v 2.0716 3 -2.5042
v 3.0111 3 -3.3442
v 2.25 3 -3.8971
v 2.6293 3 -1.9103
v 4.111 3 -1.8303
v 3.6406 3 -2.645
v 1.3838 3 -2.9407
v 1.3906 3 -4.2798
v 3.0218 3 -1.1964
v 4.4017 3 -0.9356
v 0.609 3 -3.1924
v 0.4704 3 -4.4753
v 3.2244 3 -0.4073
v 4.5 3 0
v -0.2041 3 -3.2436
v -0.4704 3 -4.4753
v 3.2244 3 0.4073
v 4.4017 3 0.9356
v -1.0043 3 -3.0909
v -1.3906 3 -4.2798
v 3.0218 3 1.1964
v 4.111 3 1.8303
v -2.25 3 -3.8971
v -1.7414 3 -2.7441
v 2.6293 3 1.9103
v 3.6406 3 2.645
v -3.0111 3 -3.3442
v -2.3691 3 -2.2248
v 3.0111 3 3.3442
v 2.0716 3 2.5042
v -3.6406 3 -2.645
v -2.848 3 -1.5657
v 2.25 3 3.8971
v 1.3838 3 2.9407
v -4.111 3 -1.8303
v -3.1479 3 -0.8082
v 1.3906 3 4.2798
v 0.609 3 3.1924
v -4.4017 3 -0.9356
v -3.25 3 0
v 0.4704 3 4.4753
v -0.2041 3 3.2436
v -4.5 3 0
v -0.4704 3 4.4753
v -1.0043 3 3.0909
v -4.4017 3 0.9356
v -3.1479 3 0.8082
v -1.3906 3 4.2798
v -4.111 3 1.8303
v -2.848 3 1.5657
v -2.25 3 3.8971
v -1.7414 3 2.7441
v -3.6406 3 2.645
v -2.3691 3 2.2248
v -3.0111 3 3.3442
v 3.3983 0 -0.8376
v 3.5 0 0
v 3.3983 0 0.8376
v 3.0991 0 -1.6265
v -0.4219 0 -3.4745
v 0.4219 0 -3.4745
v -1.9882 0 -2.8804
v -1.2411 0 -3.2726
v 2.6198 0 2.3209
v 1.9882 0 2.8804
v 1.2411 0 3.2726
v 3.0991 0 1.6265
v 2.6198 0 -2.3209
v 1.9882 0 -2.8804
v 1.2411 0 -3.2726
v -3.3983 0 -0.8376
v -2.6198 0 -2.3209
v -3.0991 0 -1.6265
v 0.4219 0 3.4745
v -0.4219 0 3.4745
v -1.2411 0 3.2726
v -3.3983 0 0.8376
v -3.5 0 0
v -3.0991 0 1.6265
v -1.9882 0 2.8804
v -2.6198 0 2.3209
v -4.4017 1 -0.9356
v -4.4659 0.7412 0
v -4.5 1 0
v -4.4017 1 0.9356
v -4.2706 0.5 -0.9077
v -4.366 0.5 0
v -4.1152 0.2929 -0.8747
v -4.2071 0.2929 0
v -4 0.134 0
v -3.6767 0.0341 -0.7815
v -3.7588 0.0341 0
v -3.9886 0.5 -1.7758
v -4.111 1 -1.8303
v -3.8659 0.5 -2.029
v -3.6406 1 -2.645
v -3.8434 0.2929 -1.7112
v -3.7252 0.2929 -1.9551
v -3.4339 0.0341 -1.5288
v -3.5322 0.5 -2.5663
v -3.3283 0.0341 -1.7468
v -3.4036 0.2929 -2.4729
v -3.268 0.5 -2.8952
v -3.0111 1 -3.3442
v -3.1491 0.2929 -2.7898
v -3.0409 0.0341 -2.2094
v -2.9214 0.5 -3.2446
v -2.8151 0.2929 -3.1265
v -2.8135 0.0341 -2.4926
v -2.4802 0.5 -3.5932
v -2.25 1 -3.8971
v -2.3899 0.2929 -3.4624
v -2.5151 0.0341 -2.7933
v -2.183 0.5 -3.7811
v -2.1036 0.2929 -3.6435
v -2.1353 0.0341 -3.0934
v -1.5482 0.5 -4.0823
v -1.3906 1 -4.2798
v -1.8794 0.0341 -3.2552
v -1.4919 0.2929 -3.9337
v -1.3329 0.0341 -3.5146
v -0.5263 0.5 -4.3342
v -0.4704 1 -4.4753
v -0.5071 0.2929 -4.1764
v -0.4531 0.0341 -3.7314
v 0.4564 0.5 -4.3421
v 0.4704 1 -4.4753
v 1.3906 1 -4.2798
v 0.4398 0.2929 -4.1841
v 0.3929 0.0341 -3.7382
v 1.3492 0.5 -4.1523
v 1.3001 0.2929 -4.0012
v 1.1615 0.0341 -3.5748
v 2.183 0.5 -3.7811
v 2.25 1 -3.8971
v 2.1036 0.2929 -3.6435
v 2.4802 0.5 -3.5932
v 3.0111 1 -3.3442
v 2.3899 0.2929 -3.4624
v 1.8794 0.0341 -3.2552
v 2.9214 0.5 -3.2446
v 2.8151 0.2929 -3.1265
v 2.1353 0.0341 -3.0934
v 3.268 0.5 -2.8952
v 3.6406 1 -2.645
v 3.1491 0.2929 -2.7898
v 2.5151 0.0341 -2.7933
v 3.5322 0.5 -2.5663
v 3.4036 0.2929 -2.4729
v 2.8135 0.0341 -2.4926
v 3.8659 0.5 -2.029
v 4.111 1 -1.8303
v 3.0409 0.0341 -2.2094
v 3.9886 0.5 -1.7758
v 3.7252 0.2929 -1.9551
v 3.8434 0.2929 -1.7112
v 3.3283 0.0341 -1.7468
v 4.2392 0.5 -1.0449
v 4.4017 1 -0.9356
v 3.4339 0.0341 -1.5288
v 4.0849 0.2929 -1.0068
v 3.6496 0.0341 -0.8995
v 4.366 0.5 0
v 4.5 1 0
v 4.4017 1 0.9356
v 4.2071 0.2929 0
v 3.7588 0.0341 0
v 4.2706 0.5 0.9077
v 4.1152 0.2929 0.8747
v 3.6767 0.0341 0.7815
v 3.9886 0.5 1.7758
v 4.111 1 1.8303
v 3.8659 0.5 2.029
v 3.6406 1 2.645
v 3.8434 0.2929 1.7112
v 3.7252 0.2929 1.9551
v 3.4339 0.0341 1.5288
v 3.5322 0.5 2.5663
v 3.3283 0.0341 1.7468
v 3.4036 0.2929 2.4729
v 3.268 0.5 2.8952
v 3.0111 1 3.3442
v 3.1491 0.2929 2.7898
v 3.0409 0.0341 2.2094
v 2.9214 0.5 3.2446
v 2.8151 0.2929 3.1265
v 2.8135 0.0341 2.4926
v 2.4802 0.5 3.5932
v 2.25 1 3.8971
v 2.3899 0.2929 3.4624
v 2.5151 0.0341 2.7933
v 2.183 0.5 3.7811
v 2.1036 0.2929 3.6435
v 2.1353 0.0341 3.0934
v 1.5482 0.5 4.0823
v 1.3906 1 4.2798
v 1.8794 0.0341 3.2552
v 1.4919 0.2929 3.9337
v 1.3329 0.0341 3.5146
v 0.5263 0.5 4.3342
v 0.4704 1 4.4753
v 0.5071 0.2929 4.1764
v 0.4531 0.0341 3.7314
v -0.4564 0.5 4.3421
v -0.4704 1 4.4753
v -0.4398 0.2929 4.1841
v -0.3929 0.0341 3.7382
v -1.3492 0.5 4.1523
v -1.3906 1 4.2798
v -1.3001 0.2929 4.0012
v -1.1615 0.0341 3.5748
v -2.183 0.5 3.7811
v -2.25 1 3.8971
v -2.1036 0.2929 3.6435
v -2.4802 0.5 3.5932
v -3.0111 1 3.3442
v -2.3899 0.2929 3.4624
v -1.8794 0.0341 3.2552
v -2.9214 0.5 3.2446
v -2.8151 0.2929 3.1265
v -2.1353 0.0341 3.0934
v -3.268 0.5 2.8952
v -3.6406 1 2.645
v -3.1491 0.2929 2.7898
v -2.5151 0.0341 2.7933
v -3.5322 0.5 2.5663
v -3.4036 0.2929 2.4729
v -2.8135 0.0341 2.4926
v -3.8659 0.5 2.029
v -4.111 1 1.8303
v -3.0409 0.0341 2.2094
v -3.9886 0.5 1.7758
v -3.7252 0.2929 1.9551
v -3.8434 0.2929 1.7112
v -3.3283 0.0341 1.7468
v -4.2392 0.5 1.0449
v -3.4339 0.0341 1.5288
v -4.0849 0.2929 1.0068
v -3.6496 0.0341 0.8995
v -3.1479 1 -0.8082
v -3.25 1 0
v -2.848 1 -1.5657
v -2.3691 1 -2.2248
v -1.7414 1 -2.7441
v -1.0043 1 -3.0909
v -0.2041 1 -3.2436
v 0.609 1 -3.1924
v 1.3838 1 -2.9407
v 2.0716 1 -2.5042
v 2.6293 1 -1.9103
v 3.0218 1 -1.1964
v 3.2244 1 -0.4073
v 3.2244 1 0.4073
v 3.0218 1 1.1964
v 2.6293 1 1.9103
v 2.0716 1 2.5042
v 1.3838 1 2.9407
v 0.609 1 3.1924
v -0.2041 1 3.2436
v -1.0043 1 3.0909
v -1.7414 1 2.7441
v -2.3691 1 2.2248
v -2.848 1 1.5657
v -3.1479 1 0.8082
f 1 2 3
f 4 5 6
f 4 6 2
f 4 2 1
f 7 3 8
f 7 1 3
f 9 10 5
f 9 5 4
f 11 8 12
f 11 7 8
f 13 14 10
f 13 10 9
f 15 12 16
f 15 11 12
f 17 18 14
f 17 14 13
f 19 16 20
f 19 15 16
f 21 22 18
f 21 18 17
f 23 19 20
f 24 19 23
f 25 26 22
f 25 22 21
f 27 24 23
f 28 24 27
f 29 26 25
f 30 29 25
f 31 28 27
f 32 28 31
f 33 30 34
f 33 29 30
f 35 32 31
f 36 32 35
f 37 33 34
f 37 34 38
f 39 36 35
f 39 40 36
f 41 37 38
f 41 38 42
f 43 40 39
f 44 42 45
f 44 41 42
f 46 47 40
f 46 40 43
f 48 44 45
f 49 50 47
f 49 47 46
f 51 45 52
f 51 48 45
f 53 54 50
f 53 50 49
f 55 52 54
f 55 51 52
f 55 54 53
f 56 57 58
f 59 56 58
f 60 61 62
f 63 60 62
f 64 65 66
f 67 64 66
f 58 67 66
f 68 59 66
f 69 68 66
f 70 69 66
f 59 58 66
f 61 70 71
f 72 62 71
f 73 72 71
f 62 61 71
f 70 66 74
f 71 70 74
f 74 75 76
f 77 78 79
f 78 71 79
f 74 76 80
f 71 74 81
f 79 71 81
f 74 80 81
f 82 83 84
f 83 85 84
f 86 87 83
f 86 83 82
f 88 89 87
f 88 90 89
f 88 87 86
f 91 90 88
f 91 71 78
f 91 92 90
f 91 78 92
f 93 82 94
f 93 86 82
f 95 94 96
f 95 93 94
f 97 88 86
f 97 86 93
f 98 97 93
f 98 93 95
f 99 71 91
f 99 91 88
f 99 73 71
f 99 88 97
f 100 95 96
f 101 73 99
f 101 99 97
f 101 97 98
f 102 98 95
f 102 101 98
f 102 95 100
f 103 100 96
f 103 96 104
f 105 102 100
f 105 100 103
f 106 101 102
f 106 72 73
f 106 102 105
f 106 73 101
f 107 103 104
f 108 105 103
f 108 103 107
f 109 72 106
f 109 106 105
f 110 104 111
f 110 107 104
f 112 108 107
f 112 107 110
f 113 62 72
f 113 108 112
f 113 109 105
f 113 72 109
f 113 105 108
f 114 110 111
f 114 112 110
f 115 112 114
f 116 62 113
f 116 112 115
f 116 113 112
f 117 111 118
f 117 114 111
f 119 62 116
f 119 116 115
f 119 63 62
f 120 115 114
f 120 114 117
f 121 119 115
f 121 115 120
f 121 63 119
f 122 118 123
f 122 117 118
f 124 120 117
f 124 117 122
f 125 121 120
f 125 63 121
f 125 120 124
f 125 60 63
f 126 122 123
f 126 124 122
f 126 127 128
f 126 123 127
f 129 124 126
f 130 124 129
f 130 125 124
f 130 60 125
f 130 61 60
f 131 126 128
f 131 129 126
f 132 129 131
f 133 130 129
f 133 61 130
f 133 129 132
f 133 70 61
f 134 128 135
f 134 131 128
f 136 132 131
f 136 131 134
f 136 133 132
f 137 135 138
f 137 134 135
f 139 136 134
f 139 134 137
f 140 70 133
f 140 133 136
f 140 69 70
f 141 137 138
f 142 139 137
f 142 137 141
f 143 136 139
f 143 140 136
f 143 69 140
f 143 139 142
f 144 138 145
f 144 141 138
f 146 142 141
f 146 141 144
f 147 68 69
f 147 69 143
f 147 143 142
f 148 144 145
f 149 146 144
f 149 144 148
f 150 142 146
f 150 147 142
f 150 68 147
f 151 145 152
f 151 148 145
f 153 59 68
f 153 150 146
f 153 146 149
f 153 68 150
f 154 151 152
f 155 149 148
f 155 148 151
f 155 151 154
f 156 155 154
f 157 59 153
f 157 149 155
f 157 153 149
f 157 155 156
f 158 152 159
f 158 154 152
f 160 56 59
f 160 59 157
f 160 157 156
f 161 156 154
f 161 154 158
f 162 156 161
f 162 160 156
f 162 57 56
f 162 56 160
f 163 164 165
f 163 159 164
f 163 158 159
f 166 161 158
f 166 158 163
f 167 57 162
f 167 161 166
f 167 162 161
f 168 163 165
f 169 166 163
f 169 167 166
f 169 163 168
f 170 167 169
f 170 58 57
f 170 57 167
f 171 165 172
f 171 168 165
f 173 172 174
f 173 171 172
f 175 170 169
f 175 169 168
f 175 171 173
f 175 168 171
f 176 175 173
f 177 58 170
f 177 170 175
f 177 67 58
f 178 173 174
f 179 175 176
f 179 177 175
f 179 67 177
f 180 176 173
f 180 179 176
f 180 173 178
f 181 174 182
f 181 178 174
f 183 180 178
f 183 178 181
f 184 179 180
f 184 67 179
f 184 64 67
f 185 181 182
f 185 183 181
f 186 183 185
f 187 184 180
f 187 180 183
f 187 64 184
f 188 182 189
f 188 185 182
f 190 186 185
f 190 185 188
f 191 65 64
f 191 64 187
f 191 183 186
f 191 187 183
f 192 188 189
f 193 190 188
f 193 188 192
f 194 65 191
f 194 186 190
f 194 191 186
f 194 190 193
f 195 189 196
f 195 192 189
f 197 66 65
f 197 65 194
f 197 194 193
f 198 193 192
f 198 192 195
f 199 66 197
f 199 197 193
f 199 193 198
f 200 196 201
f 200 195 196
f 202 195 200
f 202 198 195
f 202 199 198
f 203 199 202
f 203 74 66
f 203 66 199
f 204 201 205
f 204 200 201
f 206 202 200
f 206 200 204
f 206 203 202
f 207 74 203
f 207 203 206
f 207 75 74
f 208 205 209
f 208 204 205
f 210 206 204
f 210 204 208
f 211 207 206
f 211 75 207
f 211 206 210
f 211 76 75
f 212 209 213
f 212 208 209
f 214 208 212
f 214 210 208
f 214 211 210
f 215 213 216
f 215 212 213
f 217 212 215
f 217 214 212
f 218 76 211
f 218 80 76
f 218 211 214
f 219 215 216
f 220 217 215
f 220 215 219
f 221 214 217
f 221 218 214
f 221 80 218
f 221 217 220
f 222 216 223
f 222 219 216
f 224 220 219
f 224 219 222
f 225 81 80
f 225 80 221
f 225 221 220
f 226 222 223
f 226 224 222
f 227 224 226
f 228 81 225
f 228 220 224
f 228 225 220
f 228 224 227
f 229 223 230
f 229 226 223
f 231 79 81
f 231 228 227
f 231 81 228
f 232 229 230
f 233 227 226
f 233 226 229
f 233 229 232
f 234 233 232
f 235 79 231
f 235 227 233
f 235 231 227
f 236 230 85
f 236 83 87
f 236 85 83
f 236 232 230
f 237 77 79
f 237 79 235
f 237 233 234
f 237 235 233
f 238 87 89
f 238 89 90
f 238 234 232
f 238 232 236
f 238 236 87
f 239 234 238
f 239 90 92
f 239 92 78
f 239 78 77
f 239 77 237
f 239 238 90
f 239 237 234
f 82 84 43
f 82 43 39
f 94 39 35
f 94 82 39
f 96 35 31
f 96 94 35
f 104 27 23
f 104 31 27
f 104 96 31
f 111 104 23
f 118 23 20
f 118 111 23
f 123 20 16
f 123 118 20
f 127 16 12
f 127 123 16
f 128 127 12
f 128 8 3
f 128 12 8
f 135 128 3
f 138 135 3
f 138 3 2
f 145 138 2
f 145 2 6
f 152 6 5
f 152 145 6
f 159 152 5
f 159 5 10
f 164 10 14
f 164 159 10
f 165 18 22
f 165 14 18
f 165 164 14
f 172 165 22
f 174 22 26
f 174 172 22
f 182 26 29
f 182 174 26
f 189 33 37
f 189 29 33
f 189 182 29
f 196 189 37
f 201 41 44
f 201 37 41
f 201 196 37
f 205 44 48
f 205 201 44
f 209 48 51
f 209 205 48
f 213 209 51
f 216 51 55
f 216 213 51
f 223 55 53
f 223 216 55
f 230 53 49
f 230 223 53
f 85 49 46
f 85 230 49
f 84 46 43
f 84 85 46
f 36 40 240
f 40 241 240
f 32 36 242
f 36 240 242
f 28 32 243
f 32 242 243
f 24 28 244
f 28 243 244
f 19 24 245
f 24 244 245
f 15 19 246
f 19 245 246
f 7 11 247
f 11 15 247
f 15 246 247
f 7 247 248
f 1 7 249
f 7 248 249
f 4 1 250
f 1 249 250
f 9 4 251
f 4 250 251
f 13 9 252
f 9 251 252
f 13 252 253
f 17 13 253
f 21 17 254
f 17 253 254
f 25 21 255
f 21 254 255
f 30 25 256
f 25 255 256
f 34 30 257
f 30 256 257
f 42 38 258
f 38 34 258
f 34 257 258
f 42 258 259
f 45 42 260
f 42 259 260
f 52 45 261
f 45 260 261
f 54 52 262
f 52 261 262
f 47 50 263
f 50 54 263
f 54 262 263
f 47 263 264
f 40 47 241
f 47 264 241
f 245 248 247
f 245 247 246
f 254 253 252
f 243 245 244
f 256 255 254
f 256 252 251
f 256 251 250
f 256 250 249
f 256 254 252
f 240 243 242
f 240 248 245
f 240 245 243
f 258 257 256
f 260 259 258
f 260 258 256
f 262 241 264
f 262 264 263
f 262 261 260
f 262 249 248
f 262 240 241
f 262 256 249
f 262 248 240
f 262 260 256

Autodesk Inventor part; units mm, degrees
ref_plane "YZ Plane" through (0, 0, 0) normal (1, 0, 0) x (0, 1, 0)
ref_plane "XZ Plane" through (0, 0, 0) normal (0, 1, 0) x (-1, 0, 0)
ref_plane "XY Plane" through (0, 0, 0) normal (0, 0, 1) x (1, 0, 0)
sketch "Sketch1" plane through (0, 0, 0) normal (0, 1, 0) x (-1, 0, 0)
  circle A0 centre (0, 0) radius 3.25
  circle A1 centre (0, 0) radius 4.5
  dimension "d0" = 6.5
  dimension "d1" = 9
extrude "Extrusion1" add sketch "Sketch1" along normal blind 3
extrude "Extrusion2" add sketch "Sketch1" along normal blind 1 contours A0
fillet "Fillet1" radius 1 1 edges at (4.5, 0, 0)
properties part number "button_cap"
